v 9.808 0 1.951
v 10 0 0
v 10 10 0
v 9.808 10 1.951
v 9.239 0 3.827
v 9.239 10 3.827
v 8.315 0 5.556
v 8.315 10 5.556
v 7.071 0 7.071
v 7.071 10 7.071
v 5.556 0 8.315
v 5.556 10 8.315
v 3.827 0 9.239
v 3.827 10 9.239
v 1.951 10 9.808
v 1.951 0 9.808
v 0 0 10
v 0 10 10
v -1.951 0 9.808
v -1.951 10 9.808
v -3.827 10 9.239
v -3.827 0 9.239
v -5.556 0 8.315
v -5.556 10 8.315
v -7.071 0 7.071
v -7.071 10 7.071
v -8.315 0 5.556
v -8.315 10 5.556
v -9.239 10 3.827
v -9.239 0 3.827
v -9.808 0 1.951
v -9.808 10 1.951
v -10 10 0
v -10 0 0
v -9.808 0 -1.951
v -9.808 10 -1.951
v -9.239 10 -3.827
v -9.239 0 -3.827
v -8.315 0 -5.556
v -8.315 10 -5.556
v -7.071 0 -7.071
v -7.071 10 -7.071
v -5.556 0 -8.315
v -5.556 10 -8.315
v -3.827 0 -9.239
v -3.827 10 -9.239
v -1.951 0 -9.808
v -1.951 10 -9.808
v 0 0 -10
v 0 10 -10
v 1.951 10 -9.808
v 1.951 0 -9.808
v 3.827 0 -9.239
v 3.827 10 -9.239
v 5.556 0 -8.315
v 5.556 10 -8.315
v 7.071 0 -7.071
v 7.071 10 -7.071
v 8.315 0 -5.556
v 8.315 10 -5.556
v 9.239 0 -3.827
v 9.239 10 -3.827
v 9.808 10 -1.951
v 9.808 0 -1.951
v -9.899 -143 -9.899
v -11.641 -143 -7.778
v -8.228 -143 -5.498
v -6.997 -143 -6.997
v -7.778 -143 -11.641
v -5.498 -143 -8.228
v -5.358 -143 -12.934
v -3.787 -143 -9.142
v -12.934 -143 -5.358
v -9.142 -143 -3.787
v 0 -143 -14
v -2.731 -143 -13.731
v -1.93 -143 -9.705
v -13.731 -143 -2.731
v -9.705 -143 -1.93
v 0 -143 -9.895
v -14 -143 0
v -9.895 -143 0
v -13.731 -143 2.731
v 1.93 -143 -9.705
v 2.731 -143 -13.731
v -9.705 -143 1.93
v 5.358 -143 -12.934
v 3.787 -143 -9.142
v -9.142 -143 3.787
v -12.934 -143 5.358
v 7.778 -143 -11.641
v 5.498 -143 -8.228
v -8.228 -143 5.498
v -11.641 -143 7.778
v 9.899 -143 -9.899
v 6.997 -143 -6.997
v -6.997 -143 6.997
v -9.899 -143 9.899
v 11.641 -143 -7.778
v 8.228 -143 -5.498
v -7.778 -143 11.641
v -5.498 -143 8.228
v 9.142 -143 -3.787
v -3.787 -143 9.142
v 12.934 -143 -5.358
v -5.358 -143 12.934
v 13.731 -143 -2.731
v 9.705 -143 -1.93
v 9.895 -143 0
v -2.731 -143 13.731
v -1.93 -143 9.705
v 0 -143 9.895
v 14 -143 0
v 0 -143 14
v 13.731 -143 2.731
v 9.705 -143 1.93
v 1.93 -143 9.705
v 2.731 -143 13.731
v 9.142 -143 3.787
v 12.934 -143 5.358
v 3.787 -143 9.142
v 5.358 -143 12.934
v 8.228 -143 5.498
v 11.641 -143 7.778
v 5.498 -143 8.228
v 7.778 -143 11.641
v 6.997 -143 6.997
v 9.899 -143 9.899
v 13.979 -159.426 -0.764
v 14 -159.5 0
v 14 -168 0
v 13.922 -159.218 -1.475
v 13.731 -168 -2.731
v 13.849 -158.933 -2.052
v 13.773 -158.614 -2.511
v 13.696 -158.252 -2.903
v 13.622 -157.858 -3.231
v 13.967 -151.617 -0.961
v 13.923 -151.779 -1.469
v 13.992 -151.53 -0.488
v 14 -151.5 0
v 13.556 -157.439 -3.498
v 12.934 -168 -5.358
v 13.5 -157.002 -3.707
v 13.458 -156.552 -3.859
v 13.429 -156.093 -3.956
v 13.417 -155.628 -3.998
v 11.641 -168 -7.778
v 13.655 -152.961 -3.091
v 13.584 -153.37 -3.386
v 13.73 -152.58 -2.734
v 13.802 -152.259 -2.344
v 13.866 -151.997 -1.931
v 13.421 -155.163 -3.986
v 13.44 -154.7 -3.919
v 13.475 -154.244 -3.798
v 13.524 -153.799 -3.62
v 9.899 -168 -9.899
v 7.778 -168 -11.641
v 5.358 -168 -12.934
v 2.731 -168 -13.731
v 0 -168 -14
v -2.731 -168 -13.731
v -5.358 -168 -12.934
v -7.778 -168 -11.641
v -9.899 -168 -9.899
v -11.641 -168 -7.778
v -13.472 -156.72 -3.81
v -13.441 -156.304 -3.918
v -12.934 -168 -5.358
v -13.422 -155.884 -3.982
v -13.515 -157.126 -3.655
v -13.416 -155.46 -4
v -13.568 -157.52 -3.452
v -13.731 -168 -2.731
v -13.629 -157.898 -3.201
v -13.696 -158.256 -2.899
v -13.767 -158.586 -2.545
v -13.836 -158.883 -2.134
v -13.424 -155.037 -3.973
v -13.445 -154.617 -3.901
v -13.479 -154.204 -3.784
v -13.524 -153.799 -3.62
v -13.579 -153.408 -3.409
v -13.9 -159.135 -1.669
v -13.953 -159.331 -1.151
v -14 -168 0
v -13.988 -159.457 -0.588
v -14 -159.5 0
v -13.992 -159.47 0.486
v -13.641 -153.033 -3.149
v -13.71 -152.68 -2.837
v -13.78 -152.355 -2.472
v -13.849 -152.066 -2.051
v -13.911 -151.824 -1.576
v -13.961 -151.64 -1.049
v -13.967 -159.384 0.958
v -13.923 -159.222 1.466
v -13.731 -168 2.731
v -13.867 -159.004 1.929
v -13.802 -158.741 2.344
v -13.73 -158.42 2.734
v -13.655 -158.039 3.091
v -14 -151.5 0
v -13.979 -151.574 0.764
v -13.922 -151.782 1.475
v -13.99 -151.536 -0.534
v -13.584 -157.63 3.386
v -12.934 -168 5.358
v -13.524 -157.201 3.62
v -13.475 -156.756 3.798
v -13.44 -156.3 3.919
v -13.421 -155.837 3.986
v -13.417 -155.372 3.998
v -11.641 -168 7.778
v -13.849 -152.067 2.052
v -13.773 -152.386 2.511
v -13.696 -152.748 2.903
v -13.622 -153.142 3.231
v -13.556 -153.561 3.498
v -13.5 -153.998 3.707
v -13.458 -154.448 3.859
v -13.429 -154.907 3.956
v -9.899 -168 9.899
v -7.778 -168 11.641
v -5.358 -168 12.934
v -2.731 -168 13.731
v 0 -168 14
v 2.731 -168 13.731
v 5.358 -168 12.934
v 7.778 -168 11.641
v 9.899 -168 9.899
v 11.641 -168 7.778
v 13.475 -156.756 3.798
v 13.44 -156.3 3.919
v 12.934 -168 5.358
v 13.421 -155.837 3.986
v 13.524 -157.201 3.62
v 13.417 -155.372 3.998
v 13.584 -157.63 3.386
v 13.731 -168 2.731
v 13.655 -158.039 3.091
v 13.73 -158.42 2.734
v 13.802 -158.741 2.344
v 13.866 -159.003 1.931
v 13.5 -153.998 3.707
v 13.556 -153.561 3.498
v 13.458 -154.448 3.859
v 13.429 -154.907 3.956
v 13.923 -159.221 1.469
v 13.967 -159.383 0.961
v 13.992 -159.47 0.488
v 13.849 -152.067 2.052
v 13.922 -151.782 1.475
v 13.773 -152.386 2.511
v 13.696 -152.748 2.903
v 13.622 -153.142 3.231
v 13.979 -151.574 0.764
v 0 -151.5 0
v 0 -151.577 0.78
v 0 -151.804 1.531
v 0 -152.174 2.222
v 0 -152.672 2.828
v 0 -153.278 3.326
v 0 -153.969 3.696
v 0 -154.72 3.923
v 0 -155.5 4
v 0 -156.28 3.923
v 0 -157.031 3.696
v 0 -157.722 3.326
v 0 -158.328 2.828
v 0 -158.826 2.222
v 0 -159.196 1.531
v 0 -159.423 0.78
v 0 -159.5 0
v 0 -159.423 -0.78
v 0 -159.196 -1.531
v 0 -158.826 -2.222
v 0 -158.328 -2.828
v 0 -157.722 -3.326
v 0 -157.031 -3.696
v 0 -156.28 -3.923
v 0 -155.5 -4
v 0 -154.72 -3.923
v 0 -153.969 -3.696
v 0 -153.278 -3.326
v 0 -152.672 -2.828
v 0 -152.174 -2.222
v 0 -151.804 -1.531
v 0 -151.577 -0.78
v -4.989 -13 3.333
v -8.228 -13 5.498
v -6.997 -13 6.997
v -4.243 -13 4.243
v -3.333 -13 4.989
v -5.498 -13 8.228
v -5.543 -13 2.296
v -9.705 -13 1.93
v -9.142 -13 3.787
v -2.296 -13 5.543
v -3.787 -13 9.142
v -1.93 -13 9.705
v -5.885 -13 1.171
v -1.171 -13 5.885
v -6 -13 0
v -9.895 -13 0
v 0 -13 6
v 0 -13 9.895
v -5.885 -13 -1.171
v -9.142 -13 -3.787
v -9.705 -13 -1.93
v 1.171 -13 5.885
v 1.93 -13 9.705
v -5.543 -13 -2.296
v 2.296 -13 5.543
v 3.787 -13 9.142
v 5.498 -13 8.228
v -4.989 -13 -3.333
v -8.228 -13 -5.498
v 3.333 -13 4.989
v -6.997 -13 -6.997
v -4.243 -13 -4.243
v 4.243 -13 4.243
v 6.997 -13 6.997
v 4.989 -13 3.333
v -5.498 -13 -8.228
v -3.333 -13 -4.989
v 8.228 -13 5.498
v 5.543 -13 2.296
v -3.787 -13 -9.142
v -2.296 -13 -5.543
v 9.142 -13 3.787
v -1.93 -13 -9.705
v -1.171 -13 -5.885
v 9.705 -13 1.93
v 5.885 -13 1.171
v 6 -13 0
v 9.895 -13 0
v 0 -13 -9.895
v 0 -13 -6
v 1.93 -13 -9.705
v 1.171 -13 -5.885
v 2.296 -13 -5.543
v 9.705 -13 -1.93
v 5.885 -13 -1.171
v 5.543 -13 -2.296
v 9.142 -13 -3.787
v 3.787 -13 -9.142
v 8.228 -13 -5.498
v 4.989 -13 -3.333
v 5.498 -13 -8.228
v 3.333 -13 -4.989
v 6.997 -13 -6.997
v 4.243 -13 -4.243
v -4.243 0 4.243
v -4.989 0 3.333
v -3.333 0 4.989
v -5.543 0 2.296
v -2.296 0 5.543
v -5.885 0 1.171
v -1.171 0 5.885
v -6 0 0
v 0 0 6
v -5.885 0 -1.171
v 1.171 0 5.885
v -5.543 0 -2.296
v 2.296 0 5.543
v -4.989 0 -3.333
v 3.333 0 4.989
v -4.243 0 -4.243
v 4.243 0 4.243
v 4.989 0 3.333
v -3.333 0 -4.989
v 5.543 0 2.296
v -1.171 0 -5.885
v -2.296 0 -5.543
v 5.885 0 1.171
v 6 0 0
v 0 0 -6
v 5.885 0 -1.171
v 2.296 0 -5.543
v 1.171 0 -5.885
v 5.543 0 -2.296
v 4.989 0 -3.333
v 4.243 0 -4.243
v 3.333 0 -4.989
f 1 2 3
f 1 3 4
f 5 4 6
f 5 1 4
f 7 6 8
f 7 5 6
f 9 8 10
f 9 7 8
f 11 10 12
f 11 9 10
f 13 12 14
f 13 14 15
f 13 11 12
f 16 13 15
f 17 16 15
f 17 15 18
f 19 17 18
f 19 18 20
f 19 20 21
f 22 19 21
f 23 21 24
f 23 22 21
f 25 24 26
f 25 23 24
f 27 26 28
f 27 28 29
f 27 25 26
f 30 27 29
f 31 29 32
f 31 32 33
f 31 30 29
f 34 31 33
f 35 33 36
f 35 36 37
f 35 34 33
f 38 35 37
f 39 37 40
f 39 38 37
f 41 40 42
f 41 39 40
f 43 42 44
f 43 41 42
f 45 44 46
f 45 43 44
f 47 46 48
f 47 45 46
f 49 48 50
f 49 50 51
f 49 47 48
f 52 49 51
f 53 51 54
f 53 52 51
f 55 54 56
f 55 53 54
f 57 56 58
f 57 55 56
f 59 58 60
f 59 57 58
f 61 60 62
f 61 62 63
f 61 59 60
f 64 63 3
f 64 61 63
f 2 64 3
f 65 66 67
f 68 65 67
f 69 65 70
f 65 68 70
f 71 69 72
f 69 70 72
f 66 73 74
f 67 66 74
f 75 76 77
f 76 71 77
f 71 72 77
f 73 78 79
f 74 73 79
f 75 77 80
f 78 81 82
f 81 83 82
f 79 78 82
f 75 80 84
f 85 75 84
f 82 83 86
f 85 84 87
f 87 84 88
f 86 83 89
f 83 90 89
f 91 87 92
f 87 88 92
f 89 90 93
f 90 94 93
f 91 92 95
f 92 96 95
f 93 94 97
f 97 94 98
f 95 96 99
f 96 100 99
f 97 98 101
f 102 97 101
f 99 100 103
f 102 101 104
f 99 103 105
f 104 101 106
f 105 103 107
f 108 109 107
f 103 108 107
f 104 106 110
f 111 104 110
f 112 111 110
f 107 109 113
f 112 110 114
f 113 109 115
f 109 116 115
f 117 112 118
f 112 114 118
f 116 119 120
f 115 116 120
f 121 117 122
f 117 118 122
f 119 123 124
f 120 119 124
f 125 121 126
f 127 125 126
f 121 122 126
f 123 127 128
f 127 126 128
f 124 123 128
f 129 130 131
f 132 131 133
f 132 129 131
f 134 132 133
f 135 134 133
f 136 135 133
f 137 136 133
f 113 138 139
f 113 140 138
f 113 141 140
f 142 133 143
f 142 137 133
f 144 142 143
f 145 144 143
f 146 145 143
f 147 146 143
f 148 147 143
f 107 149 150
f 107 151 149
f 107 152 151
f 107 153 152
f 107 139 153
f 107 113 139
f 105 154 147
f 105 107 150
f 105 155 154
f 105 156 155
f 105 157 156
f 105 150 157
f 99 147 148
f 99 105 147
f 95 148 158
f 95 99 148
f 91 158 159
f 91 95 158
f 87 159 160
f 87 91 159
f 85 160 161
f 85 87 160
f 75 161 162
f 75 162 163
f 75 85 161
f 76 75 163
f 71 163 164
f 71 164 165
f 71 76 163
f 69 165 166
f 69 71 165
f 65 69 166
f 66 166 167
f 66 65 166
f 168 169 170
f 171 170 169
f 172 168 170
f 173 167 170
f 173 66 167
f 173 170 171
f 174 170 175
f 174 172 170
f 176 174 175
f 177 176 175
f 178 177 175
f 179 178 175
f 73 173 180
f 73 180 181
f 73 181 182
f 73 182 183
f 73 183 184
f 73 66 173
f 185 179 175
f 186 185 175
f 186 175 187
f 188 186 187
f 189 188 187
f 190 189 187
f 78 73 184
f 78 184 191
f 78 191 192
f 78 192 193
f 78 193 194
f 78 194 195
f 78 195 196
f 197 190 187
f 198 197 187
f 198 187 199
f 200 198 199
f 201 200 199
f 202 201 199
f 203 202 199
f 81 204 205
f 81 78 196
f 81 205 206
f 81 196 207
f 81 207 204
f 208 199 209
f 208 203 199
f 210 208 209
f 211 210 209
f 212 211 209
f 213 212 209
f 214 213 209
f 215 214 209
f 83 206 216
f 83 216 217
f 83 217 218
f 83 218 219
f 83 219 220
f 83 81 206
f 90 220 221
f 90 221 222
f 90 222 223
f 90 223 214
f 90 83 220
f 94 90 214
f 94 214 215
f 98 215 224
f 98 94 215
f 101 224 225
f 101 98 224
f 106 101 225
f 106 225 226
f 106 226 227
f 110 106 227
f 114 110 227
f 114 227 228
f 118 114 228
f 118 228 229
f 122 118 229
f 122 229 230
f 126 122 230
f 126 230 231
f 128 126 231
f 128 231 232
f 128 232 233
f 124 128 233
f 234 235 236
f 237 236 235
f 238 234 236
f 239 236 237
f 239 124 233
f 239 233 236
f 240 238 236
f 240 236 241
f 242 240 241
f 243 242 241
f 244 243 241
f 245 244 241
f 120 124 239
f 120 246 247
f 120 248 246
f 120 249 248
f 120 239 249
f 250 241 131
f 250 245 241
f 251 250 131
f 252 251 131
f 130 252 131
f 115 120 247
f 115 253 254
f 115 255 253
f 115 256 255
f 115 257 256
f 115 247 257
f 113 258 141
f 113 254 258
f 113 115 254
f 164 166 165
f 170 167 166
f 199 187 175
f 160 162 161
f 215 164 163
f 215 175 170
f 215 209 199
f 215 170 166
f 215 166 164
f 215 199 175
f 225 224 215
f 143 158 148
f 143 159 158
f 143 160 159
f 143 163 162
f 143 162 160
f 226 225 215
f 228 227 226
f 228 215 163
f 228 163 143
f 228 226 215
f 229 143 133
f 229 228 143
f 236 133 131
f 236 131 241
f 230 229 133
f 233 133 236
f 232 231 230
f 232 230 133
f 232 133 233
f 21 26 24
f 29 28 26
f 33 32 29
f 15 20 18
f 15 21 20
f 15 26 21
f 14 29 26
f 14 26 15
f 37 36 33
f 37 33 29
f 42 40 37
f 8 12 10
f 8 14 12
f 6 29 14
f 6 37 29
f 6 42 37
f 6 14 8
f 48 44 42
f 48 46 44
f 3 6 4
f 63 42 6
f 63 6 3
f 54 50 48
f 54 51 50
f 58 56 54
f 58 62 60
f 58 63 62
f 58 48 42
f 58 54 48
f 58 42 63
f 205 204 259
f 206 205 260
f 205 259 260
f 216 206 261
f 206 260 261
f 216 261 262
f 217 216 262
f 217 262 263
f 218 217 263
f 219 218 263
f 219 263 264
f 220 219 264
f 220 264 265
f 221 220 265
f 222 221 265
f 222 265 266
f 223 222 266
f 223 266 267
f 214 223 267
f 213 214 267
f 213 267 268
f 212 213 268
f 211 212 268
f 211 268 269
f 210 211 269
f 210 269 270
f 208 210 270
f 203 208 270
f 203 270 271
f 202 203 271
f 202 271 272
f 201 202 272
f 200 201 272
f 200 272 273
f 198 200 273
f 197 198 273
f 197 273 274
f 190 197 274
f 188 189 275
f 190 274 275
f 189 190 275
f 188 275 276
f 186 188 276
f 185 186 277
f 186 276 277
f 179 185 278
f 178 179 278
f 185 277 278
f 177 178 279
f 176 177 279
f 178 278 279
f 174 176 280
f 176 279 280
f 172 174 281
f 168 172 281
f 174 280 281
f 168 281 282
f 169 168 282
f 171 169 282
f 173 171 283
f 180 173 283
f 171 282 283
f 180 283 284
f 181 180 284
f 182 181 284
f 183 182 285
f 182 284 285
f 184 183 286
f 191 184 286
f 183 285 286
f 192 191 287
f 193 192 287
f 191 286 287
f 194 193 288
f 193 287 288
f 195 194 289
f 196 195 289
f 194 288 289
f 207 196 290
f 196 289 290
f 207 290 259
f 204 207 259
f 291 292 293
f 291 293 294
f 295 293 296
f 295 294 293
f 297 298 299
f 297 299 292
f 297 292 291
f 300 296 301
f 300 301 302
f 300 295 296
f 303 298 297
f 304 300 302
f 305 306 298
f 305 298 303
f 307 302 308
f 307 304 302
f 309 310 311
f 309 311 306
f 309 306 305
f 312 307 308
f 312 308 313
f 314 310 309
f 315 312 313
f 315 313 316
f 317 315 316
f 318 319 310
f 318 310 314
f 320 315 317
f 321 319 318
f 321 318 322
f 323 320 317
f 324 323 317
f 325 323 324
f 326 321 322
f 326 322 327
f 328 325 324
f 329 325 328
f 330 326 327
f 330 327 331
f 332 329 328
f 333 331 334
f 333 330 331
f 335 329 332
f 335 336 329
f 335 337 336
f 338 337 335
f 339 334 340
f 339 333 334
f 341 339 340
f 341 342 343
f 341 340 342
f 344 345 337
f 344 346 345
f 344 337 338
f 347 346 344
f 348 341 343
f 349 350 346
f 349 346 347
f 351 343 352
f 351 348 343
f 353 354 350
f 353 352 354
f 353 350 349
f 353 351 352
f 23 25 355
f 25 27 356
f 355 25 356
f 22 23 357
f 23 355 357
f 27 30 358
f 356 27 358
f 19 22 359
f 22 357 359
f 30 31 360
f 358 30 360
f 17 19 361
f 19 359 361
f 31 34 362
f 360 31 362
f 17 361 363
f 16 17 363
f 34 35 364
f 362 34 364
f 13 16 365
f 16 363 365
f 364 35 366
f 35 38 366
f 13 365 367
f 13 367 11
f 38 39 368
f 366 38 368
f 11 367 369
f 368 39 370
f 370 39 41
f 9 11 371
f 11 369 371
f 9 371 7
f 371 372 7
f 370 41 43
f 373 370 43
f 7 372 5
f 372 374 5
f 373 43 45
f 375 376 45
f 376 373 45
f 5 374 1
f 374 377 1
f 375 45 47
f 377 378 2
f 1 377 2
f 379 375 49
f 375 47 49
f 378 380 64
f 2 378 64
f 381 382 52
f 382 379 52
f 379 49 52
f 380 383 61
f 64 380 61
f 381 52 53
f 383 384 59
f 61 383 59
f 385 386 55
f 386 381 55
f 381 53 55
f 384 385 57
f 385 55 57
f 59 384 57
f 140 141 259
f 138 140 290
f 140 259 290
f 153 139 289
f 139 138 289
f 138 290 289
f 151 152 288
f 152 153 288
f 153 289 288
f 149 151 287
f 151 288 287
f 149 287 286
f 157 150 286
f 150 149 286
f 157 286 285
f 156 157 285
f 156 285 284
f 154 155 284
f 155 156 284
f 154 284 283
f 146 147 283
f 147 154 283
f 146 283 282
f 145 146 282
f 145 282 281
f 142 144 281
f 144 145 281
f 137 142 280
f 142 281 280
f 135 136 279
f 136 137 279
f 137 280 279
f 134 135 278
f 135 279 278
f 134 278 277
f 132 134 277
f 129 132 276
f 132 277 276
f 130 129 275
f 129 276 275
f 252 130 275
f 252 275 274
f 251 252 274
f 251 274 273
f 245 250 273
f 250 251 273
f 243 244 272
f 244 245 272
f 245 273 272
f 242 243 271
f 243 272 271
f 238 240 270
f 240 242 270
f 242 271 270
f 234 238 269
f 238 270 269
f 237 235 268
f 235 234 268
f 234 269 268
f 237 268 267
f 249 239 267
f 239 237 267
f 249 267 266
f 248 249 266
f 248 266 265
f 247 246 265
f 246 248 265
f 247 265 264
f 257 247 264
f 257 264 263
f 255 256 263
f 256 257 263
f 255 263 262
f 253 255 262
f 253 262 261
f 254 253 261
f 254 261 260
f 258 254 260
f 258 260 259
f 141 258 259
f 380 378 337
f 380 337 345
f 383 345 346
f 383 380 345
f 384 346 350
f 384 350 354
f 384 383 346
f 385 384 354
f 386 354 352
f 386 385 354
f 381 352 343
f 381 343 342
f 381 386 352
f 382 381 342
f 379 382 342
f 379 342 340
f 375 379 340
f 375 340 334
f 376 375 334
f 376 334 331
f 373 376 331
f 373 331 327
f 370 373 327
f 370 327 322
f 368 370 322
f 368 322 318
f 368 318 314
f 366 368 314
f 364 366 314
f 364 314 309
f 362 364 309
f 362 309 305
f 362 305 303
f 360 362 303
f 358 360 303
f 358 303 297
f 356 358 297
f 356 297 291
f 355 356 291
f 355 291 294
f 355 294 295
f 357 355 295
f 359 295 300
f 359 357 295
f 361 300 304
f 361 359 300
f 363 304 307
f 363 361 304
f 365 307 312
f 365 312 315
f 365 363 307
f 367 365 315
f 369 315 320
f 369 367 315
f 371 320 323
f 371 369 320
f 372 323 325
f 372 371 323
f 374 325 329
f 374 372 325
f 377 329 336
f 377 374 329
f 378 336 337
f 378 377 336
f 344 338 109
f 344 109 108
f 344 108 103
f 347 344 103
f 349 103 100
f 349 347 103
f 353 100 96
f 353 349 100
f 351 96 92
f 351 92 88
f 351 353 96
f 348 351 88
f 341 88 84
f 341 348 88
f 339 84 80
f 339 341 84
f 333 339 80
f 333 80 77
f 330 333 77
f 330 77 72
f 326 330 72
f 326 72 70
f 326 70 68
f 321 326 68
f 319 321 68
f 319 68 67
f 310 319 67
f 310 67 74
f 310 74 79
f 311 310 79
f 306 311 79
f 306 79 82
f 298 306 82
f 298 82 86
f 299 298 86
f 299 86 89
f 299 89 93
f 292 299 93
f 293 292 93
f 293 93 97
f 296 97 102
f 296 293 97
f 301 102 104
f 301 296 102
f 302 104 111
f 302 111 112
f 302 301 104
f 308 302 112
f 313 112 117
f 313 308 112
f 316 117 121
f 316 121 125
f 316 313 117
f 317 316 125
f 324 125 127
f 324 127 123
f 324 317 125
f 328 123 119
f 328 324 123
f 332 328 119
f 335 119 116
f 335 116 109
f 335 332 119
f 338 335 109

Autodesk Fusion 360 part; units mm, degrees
sketch "Sketch1" plane through (0, 0, 0) normal (0, 1, 0) x (1, 0, 0)
  circle A0 centre (0, 0) radius 10
  circle A1 centre (0, 0) radius 6
  dimension "d1" = 20
  dimension "d2" = 12
extrude "Extrude1" add sketch "Sketch1" along normal blind 10 contours A0 | A1
extrude "Extrude3" add sketch "Sketch1" against normal blind 13 contours A1
extrude "Extrude4" add sketch "Sketch1" against normal blind 130 from surface at -13 contours A0 | A1
sketch "Sketch2" plane through (0, -143, 0) normal (0, -1, 0) x (1, 0, 0)
  circle A0 centre (0, 0) radius 10
  circle A1 centre (0, 0) radius 14
  dimension "d12" = 28
extrude "Extrude5" add sketch "Sketch2" along normal blind 25 contours A0 | A1
thread "Thread1" "ISO Metric profile 20.0 M20x2.5 6g" major diameter 19.7905 minor diameter 16.938 pitch 2.5 angle 60 resizes the face on face at (9.9503, -56.3333, 0.9957)
sketch "Sketch3" plane through (0, 0, 0) normal (1, 0, 0) x (0, 1, 0)
  circle A0 centre (-155.5, 0) radius 4
  line L0 (-143, 14) -> (-143, -14)
  dimension "d15" = 8
  dimension "d20" = 12.5
extrude "Extrude6" cut sketch "Sketch3" along normal up to surface and the other way blind 14 end surface at (13.9826, -151.3333, 0.6978)
